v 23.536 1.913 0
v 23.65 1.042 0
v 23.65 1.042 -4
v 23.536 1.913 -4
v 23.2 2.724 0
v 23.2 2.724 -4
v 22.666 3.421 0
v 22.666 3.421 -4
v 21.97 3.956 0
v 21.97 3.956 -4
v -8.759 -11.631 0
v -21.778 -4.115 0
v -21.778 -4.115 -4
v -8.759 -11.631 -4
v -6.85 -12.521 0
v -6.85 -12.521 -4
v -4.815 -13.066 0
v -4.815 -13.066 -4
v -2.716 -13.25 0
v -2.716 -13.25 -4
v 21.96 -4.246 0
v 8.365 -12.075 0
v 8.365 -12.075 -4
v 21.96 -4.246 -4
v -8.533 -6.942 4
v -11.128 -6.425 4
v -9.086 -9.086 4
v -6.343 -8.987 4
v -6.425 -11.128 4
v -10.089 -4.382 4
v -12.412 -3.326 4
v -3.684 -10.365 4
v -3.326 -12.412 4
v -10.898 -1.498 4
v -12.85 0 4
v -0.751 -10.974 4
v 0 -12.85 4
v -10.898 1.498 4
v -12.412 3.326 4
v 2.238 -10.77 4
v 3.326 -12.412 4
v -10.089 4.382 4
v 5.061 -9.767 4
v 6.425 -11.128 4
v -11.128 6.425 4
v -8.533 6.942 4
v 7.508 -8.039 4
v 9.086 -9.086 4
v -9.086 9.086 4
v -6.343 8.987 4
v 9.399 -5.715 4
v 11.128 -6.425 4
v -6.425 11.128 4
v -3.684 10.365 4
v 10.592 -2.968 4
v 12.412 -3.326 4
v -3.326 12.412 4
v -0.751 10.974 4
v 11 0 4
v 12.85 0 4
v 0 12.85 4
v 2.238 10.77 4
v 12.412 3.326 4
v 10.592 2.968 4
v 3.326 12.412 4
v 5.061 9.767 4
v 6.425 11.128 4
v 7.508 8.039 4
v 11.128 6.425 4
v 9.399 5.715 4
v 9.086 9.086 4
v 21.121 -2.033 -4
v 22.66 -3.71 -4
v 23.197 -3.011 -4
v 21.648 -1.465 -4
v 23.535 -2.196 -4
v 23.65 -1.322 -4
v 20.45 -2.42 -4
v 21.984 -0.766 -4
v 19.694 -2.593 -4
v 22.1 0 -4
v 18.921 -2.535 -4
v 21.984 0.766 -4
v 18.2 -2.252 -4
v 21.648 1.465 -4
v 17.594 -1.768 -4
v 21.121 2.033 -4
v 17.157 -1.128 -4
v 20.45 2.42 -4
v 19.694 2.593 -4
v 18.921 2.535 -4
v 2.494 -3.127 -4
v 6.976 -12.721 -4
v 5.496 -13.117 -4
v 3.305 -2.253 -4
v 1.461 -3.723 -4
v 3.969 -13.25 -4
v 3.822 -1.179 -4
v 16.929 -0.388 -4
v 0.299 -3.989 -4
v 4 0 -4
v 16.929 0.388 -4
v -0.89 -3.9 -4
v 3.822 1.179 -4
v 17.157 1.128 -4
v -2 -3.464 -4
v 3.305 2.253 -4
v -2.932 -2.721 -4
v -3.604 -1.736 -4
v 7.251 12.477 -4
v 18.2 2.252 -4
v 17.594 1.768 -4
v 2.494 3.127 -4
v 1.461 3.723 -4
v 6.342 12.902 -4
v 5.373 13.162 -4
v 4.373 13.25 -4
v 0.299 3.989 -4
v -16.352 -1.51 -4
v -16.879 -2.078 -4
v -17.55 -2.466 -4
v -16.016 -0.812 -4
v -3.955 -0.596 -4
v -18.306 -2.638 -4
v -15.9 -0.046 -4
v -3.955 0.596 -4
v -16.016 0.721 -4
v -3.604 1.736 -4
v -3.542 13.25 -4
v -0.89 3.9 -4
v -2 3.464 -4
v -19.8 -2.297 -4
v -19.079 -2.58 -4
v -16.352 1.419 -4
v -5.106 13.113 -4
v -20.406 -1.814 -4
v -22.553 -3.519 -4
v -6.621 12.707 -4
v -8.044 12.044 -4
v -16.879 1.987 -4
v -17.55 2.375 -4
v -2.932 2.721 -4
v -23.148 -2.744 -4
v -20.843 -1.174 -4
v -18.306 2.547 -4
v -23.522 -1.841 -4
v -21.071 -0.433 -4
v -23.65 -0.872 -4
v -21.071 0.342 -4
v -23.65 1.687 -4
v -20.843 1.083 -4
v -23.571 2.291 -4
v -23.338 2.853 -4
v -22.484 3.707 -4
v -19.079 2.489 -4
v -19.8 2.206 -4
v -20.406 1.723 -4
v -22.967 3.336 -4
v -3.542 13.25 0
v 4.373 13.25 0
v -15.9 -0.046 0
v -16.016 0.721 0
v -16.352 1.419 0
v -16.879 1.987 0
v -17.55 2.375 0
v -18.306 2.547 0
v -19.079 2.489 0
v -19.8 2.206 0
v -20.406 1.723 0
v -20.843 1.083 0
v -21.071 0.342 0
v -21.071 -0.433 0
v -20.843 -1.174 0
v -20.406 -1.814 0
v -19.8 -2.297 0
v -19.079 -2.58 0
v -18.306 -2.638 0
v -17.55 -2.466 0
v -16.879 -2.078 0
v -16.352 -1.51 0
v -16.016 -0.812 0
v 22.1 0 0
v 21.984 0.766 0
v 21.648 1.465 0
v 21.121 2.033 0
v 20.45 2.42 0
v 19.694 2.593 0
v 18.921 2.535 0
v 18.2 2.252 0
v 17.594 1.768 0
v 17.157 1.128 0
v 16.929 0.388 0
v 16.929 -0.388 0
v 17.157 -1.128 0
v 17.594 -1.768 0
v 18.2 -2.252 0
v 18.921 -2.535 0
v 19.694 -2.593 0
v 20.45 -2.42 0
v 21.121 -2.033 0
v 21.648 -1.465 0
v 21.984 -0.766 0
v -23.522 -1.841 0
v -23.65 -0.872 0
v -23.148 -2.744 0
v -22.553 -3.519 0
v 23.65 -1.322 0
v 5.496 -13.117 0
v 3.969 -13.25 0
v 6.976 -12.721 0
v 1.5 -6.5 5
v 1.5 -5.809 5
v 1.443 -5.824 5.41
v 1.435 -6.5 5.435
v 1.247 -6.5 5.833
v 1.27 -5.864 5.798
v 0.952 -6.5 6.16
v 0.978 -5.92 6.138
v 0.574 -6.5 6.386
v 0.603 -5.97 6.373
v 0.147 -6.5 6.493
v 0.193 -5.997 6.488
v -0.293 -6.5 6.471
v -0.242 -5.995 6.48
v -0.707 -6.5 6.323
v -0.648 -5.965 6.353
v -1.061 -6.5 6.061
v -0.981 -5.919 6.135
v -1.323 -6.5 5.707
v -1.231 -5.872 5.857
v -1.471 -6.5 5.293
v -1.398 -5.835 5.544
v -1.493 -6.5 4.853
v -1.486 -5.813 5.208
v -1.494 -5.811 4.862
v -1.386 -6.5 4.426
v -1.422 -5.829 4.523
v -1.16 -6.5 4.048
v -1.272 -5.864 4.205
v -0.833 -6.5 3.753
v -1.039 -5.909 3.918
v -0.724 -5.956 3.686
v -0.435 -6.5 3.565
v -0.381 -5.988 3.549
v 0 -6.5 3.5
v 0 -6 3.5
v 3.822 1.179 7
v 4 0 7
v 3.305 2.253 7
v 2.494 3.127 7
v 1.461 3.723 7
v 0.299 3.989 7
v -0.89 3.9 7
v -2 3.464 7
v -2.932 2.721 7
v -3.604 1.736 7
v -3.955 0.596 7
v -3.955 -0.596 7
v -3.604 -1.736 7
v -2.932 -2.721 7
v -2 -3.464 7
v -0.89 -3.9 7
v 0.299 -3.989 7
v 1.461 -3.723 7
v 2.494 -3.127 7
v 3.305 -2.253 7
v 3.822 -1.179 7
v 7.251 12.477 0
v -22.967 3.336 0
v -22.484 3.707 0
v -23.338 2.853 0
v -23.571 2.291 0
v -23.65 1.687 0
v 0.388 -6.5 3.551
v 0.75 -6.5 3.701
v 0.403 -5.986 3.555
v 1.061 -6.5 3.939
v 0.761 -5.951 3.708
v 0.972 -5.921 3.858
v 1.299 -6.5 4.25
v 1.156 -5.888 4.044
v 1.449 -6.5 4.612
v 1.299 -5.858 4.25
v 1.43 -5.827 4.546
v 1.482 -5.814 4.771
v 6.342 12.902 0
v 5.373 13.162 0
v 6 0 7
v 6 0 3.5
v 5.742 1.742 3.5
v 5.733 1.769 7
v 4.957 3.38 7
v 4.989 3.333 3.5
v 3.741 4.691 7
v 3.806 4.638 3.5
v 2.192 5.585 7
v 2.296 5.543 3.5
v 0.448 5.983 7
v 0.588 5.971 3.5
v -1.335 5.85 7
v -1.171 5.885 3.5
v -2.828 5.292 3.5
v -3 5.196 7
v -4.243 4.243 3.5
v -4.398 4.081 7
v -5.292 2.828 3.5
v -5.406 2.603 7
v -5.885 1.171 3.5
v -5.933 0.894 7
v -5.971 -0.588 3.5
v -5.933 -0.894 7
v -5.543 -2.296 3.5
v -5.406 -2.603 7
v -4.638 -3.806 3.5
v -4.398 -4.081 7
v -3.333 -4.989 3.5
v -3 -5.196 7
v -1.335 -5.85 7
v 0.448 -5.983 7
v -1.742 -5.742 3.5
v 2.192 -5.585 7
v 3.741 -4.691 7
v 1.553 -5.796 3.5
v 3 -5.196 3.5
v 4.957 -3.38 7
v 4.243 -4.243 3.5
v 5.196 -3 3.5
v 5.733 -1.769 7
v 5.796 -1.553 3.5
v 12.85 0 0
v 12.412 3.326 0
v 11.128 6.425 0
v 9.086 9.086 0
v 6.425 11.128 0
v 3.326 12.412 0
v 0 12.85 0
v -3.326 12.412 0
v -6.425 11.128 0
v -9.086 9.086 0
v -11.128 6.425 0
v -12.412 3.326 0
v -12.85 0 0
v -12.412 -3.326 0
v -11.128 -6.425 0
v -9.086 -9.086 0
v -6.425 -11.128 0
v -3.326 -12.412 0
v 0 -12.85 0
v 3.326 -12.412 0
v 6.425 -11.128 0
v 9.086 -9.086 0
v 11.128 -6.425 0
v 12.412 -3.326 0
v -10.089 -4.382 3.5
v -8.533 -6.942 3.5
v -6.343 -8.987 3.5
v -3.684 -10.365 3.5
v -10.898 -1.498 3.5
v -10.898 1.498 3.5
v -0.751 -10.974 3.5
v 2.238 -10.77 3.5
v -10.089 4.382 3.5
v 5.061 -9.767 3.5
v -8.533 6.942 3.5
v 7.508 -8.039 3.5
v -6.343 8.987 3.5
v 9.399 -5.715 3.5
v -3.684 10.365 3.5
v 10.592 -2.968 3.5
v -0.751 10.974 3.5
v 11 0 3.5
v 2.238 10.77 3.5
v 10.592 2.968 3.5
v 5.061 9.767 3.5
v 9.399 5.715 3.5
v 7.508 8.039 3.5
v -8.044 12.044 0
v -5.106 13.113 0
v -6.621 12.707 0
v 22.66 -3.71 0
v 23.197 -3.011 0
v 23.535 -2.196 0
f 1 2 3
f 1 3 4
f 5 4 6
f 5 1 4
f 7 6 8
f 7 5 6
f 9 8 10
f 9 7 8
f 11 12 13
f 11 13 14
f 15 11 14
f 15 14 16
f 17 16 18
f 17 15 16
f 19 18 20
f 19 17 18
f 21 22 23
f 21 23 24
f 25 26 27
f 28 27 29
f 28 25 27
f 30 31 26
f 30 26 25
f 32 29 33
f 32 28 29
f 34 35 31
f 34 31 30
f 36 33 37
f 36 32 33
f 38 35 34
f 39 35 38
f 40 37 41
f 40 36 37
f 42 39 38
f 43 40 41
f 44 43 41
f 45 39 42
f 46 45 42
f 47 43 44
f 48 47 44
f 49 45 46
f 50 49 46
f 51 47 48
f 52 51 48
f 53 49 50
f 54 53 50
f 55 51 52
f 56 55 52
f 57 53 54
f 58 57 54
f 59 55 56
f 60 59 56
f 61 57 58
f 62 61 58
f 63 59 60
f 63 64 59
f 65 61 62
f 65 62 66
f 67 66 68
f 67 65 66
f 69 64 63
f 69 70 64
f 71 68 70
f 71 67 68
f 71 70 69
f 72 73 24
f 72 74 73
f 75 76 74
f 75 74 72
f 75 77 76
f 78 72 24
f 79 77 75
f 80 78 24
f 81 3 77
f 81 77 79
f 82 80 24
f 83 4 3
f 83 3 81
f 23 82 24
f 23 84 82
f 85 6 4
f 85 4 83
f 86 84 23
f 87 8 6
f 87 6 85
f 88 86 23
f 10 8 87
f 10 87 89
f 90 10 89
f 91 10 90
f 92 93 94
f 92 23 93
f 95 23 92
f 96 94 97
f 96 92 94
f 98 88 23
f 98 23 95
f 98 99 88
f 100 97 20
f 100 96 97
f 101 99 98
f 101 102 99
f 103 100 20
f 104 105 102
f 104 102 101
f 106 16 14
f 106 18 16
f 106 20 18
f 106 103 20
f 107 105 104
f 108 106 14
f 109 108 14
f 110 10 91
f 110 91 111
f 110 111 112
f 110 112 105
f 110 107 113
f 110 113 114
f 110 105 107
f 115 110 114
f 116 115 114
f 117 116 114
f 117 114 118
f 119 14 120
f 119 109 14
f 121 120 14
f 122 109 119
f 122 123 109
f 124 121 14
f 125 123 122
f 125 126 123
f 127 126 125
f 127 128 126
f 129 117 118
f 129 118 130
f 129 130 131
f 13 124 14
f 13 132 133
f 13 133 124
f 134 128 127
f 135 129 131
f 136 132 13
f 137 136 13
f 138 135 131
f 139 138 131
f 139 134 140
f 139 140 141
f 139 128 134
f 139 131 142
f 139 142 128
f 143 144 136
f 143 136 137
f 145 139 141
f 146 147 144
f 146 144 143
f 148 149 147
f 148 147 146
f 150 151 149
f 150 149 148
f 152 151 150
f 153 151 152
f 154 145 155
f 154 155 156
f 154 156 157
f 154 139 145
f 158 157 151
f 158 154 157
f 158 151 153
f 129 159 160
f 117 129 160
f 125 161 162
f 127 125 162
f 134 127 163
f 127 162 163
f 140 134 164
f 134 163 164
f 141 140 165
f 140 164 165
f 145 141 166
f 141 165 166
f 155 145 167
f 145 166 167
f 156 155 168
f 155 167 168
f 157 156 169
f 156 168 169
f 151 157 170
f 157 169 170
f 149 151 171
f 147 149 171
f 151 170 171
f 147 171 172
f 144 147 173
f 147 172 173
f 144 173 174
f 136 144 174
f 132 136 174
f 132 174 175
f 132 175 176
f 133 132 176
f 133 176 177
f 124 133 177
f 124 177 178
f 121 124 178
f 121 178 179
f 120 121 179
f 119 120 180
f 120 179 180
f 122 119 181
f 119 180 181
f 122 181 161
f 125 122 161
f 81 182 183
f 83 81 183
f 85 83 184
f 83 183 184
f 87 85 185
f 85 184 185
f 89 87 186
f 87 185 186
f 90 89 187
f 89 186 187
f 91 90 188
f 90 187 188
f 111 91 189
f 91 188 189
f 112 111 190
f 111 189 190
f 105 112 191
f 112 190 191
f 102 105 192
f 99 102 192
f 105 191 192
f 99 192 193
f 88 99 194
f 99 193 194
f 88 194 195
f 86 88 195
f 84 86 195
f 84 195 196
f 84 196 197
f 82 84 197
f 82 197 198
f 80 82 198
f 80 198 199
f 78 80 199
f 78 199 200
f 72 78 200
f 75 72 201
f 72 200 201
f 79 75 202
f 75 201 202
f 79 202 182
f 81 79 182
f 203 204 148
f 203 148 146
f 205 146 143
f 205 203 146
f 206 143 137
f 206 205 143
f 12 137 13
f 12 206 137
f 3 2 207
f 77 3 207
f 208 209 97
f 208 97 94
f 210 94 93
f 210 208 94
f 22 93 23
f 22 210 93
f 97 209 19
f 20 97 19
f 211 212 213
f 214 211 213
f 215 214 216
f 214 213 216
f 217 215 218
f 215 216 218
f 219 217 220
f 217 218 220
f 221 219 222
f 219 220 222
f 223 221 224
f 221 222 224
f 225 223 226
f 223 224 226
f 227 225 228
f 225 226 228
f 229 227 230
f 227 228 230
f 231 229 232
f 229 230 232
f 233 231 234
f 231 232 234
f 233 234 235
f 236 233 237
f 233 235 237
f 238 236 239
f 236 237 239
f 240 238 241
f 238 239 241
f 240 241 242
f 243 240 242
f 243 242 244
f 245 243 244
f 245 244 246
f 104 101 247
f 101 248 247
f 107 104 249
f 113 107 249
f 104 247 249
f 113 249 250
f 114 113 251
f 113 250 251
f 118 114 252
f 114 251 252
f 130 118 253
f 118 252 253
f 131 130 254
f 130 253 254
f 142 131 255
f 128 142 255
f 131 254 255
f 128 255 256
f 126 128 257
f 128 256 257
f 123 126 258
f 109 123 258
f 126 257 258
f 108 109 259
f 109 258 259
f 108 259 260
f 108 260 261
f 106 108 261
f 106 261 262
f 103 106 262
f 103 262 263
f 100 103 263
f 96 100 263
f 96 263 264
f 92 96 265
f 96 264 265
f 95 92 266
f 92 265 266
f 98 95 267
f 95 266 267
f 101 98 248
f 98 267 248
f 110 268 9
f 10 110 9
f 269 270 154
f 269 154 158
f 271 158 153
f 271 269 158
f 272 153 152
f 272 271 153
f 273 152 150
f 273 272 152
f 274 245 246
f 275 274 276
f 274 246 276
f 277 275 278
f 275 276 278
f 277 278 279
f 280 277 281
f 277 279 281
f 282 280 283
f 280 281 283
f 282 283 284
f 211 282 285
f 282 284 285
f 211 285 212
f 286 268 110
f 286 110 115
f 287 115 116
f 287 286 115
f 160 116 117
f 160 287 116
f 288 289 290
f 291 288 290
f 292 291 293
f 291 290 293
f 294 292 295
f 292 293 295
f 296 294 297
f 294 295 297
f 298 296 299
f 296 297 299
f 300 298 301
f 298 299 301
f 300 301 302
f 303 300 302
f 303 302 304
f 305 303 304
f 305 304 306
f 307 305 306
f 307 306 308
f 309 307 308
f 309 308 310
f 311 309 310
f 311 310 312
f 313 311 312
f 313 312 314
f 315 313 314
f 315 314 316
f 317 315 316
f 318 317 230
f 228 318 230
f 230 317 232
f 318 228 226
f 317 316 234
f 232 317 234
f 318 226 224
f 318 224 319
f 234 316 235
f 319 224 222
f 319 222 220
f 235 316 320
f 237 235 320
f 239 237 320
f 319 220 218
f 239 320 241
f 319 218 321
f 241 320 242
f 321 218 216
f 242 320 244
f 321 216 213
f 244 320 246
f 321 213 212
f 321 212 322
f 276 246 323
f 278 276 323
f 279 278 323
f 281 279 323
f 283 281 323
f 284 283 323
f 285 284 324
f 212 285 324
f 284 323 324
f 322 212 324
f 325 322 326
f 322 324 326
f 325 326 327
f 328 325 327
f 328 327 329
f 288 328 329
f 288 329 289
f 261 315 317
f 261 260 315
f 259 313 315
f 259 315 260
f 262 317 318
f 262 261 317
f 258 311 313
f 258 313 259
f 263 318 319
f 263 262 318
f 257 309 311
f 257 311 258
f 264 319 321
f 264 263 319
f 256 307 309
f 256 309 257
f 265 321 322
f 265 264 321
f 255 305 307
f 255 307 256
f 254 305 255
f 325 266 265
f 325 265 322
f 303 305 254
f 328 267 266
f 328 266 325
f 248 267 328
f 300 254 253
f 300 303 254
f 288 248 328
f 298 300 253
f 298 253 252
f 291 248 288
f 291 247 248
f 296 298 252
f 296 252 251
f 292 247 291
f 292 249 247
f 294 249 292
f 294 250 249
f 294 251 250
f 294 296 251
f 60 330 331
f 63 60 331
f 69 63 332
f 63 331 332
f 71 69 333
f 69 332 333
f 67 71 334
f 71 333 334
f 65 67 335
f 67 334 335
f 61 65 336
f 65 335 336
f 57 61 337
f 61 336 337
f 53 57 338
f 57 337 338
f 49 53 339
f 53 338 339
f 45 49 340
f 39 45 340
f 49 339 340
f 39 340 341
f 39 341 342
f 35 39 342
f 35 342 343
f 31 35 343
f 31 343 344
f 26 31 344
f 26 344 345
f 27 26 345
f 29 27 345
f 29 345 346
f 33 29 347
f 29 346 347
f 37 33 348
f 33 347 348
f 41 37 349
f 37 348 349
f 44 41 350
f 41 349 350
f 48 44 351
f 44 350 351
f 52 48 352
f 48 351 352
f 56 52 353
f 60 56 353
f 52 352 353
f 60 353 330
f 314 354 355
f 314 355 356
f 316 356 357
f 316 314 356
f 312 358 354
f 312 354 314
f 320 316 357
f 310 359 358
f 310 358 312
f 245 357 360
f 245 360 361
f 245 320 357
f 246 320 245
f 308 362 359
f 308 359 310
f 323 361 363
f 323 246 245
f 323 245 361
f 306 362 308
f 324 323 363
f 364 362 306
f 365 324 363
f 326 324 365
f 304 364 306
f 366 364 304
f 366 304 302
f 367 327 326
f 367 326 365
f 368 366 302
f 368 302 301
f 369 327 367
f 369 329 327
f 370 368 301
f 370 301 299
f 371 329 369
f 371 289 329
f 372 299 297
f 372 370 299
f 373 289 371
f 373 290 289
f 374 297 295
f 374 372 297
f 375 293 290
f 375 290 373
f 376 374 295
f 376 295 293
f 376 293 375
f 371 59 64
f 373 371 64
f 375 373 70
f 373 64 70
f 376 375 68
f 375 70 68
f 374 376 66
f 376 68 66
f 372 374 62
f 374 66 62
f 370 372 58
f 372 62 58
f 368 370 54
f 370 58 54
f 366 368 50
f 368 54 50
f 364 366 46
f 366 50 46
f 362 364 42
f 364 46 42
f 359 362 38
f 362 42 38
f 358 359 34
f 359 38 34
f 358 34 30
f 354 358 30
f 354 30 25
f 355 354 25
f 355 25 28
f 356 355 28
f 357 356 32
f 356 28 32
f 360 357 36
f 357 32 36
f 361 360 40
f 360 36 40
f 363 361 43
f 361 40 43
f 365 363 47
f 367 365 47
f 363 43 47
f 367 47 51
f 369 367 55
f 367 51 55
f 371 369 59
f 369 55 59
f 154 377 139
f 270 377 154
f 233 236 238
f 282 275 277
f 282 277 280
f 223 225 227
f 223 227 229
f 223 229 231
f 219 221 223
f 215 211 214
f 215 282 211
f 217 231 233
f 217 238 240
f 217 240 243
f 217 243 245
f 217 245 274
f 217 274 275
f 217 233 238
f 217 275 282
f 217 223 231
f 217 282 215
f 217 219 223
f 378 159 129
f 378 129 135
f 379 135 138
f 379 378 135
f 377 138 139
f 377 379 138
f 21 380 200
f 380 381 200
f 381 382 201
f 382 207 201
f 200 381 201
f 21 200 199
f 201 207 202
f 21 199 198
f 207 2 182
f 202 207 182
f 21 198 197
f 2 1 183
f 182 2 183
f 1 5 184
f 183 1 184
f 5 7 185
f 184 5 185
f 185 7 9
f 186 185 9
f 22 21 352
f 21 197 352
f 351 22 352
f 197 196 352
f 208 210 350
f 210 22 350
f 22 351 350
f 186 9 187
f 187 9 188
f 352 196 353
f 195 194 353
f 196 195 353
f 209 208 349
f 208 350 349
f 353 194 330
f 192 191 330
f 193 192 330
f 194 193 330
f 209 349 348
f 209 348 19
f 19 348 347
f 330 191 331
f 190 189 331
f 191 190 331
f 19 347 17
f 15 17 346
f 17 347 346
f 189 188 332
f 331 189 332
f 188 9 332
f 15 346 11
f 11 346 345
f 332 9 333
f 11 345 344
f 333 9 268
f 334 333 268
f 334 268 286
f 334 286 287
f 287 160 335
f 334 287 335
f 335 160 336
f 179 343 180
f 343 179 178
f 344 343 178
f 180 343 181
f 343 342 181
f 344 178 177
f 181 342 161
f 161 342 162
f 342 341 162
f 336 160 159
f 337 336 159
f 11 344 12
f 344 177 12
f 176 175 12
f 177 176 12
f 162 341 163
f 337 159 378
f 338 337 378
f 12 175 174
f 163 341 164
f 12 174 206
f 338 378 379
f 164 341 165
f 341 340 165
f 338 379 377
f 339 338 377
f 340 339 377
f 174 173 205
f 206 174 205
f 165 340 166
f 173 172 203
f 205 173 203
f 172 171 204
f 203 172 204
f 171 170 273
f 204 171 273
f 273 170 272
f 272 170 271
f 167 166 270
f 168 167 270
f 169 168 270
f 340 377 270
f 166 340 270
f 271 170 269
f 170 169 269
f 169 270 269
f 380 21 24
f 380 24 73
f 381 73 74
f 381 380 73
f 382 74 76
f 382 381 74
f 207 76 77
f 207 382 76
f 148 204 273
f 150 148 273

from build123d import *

# Parameters (mm, degrees)
SKETCH_R        = 12.85
PAD_DEPTH       = 4
SKETCH003_R     = 11
POCKET_DEPTH    = 0.5
SKETCH004_R     = 6
PAD001_DEPTH    = 3.5
SKETCH006_R     = 1.5
PAD002_DEPTH    = 6.5
SKETCH005_R     = 4
POCKET001_DEPTH = 7.001
SKETCH007_R     = 2.6
PAD003_DEPTH    = 4
SKETCH008_R     = 4
POCKET002_DEPTH = 4


with BuildPart() as part:
    # Sketch → Pad (new body)
    with BuildSketch(Plane.XY):
        Circle(SKETCH_R)
    extrude(amount=PAD_DEPTH)

    # Sketch003 → Pocket (cut)
    with BuildSketch(Plane.XY.offset(4)):
        Circle(SKETCH003_R)
    extrude(amount=-POCKET_DEPTH, mode=Mode.SUBTRACT)

    # Sketch004 (on Face5 of Pocket) → Pad001 (join)
    with BuildSketch(Plane.XY.offset(3.5)):
        Circle(SKETCH004_R)
    extrude(amount=PAD001_DEPTH)

    # Sketch006 → Pad002 (join)
    with BuildSketch(Plane.XZ):
        with Locations((0, 5)):
            Circle(SKETCH006_R)
    extrude(amount=PAD002_DEPTH)

    # Sketch005 (on Face7 of Pad001) → Pocket001 (cut, through all)
    with BuildSketch(Plane.XY.offset(7)):
        Circle(SKETCH005_R)
    extrude(amount=-POCKET001_DEPTH, mode=Mode.SUBTRACT)

    # Sketch007 → Pad003 (join)
    with BuildSketch(Plane.XY):
        with BuildLine():
            Line((-3.542445, 13.25), (4.373404, 13.25))
            ThreePointArc((7.251161, 12.477086), (5.863276, 13.053407), (4.373404, 13.25))
            Line((7.251161, 12.477086), (21.969939, 3.956011))
            ThreePointArc((23.65, 1.04209), (23.1999, 2.72387), (21.969939, 3.956011))
            Line((23.65, 1.04209), (23.65, -1.322208))
            ThreePointArc((21.959502, -4.246432), (23.196964, -3.011059), (23.65, -1.322208))
            Line((8.3652, -12.074699), (21.959502, -4.246432))
            ThreePointArc((3.969015, -13.25), (6.244305, -12.951104), (8.3652, -12.074699))
            Line((3.969015, -13.25), (-2.715889, -13.25))
            ThreePointArc((-8.759411, -11.630643), (-5.844246, -12.838144), (-2.715889, -13.25))
            Line((-21.777636, -4.114568), (-8.759411, -11.630643))
            ThreePointArc((-23.65, -0.871538), (-23.148302, -2.743902), (-21.777636, -4.114568))
            Line((-23.65, -0.871538), (-23.65, 1.686966))
            ThreePointArc((-22.483817, 3.706854), (-23.337522, 2.853149), (-23.65, 1.686966))
            Line((-8.043592, 12.043921), (-22.483817, 3.706854))
            ThreePointArc((-3.542445, 13.25), (-5.87241, 12.943254), (-8.043592, 12.043921))
        make_face()
        with Locations((-18.5, -0.045589)):
            Circle(SKETCH007_R, mode=Mode.SUBTRACT)
        with Locations((19.5, 0)):
            Circle(SKETCH007_R, mode=Mode.SUBTRACT)
    extrude(amount=-PAD003_DEPTH)

    # Sketch008 → Pocket002 (cut)
    with BuildSketch(Plane.XY):
        Circle(SKETCH008_R)
    extrude(amount=-POCKET002_DEPTH, mode=Mode.SUBTRACT)


solid = part.part
